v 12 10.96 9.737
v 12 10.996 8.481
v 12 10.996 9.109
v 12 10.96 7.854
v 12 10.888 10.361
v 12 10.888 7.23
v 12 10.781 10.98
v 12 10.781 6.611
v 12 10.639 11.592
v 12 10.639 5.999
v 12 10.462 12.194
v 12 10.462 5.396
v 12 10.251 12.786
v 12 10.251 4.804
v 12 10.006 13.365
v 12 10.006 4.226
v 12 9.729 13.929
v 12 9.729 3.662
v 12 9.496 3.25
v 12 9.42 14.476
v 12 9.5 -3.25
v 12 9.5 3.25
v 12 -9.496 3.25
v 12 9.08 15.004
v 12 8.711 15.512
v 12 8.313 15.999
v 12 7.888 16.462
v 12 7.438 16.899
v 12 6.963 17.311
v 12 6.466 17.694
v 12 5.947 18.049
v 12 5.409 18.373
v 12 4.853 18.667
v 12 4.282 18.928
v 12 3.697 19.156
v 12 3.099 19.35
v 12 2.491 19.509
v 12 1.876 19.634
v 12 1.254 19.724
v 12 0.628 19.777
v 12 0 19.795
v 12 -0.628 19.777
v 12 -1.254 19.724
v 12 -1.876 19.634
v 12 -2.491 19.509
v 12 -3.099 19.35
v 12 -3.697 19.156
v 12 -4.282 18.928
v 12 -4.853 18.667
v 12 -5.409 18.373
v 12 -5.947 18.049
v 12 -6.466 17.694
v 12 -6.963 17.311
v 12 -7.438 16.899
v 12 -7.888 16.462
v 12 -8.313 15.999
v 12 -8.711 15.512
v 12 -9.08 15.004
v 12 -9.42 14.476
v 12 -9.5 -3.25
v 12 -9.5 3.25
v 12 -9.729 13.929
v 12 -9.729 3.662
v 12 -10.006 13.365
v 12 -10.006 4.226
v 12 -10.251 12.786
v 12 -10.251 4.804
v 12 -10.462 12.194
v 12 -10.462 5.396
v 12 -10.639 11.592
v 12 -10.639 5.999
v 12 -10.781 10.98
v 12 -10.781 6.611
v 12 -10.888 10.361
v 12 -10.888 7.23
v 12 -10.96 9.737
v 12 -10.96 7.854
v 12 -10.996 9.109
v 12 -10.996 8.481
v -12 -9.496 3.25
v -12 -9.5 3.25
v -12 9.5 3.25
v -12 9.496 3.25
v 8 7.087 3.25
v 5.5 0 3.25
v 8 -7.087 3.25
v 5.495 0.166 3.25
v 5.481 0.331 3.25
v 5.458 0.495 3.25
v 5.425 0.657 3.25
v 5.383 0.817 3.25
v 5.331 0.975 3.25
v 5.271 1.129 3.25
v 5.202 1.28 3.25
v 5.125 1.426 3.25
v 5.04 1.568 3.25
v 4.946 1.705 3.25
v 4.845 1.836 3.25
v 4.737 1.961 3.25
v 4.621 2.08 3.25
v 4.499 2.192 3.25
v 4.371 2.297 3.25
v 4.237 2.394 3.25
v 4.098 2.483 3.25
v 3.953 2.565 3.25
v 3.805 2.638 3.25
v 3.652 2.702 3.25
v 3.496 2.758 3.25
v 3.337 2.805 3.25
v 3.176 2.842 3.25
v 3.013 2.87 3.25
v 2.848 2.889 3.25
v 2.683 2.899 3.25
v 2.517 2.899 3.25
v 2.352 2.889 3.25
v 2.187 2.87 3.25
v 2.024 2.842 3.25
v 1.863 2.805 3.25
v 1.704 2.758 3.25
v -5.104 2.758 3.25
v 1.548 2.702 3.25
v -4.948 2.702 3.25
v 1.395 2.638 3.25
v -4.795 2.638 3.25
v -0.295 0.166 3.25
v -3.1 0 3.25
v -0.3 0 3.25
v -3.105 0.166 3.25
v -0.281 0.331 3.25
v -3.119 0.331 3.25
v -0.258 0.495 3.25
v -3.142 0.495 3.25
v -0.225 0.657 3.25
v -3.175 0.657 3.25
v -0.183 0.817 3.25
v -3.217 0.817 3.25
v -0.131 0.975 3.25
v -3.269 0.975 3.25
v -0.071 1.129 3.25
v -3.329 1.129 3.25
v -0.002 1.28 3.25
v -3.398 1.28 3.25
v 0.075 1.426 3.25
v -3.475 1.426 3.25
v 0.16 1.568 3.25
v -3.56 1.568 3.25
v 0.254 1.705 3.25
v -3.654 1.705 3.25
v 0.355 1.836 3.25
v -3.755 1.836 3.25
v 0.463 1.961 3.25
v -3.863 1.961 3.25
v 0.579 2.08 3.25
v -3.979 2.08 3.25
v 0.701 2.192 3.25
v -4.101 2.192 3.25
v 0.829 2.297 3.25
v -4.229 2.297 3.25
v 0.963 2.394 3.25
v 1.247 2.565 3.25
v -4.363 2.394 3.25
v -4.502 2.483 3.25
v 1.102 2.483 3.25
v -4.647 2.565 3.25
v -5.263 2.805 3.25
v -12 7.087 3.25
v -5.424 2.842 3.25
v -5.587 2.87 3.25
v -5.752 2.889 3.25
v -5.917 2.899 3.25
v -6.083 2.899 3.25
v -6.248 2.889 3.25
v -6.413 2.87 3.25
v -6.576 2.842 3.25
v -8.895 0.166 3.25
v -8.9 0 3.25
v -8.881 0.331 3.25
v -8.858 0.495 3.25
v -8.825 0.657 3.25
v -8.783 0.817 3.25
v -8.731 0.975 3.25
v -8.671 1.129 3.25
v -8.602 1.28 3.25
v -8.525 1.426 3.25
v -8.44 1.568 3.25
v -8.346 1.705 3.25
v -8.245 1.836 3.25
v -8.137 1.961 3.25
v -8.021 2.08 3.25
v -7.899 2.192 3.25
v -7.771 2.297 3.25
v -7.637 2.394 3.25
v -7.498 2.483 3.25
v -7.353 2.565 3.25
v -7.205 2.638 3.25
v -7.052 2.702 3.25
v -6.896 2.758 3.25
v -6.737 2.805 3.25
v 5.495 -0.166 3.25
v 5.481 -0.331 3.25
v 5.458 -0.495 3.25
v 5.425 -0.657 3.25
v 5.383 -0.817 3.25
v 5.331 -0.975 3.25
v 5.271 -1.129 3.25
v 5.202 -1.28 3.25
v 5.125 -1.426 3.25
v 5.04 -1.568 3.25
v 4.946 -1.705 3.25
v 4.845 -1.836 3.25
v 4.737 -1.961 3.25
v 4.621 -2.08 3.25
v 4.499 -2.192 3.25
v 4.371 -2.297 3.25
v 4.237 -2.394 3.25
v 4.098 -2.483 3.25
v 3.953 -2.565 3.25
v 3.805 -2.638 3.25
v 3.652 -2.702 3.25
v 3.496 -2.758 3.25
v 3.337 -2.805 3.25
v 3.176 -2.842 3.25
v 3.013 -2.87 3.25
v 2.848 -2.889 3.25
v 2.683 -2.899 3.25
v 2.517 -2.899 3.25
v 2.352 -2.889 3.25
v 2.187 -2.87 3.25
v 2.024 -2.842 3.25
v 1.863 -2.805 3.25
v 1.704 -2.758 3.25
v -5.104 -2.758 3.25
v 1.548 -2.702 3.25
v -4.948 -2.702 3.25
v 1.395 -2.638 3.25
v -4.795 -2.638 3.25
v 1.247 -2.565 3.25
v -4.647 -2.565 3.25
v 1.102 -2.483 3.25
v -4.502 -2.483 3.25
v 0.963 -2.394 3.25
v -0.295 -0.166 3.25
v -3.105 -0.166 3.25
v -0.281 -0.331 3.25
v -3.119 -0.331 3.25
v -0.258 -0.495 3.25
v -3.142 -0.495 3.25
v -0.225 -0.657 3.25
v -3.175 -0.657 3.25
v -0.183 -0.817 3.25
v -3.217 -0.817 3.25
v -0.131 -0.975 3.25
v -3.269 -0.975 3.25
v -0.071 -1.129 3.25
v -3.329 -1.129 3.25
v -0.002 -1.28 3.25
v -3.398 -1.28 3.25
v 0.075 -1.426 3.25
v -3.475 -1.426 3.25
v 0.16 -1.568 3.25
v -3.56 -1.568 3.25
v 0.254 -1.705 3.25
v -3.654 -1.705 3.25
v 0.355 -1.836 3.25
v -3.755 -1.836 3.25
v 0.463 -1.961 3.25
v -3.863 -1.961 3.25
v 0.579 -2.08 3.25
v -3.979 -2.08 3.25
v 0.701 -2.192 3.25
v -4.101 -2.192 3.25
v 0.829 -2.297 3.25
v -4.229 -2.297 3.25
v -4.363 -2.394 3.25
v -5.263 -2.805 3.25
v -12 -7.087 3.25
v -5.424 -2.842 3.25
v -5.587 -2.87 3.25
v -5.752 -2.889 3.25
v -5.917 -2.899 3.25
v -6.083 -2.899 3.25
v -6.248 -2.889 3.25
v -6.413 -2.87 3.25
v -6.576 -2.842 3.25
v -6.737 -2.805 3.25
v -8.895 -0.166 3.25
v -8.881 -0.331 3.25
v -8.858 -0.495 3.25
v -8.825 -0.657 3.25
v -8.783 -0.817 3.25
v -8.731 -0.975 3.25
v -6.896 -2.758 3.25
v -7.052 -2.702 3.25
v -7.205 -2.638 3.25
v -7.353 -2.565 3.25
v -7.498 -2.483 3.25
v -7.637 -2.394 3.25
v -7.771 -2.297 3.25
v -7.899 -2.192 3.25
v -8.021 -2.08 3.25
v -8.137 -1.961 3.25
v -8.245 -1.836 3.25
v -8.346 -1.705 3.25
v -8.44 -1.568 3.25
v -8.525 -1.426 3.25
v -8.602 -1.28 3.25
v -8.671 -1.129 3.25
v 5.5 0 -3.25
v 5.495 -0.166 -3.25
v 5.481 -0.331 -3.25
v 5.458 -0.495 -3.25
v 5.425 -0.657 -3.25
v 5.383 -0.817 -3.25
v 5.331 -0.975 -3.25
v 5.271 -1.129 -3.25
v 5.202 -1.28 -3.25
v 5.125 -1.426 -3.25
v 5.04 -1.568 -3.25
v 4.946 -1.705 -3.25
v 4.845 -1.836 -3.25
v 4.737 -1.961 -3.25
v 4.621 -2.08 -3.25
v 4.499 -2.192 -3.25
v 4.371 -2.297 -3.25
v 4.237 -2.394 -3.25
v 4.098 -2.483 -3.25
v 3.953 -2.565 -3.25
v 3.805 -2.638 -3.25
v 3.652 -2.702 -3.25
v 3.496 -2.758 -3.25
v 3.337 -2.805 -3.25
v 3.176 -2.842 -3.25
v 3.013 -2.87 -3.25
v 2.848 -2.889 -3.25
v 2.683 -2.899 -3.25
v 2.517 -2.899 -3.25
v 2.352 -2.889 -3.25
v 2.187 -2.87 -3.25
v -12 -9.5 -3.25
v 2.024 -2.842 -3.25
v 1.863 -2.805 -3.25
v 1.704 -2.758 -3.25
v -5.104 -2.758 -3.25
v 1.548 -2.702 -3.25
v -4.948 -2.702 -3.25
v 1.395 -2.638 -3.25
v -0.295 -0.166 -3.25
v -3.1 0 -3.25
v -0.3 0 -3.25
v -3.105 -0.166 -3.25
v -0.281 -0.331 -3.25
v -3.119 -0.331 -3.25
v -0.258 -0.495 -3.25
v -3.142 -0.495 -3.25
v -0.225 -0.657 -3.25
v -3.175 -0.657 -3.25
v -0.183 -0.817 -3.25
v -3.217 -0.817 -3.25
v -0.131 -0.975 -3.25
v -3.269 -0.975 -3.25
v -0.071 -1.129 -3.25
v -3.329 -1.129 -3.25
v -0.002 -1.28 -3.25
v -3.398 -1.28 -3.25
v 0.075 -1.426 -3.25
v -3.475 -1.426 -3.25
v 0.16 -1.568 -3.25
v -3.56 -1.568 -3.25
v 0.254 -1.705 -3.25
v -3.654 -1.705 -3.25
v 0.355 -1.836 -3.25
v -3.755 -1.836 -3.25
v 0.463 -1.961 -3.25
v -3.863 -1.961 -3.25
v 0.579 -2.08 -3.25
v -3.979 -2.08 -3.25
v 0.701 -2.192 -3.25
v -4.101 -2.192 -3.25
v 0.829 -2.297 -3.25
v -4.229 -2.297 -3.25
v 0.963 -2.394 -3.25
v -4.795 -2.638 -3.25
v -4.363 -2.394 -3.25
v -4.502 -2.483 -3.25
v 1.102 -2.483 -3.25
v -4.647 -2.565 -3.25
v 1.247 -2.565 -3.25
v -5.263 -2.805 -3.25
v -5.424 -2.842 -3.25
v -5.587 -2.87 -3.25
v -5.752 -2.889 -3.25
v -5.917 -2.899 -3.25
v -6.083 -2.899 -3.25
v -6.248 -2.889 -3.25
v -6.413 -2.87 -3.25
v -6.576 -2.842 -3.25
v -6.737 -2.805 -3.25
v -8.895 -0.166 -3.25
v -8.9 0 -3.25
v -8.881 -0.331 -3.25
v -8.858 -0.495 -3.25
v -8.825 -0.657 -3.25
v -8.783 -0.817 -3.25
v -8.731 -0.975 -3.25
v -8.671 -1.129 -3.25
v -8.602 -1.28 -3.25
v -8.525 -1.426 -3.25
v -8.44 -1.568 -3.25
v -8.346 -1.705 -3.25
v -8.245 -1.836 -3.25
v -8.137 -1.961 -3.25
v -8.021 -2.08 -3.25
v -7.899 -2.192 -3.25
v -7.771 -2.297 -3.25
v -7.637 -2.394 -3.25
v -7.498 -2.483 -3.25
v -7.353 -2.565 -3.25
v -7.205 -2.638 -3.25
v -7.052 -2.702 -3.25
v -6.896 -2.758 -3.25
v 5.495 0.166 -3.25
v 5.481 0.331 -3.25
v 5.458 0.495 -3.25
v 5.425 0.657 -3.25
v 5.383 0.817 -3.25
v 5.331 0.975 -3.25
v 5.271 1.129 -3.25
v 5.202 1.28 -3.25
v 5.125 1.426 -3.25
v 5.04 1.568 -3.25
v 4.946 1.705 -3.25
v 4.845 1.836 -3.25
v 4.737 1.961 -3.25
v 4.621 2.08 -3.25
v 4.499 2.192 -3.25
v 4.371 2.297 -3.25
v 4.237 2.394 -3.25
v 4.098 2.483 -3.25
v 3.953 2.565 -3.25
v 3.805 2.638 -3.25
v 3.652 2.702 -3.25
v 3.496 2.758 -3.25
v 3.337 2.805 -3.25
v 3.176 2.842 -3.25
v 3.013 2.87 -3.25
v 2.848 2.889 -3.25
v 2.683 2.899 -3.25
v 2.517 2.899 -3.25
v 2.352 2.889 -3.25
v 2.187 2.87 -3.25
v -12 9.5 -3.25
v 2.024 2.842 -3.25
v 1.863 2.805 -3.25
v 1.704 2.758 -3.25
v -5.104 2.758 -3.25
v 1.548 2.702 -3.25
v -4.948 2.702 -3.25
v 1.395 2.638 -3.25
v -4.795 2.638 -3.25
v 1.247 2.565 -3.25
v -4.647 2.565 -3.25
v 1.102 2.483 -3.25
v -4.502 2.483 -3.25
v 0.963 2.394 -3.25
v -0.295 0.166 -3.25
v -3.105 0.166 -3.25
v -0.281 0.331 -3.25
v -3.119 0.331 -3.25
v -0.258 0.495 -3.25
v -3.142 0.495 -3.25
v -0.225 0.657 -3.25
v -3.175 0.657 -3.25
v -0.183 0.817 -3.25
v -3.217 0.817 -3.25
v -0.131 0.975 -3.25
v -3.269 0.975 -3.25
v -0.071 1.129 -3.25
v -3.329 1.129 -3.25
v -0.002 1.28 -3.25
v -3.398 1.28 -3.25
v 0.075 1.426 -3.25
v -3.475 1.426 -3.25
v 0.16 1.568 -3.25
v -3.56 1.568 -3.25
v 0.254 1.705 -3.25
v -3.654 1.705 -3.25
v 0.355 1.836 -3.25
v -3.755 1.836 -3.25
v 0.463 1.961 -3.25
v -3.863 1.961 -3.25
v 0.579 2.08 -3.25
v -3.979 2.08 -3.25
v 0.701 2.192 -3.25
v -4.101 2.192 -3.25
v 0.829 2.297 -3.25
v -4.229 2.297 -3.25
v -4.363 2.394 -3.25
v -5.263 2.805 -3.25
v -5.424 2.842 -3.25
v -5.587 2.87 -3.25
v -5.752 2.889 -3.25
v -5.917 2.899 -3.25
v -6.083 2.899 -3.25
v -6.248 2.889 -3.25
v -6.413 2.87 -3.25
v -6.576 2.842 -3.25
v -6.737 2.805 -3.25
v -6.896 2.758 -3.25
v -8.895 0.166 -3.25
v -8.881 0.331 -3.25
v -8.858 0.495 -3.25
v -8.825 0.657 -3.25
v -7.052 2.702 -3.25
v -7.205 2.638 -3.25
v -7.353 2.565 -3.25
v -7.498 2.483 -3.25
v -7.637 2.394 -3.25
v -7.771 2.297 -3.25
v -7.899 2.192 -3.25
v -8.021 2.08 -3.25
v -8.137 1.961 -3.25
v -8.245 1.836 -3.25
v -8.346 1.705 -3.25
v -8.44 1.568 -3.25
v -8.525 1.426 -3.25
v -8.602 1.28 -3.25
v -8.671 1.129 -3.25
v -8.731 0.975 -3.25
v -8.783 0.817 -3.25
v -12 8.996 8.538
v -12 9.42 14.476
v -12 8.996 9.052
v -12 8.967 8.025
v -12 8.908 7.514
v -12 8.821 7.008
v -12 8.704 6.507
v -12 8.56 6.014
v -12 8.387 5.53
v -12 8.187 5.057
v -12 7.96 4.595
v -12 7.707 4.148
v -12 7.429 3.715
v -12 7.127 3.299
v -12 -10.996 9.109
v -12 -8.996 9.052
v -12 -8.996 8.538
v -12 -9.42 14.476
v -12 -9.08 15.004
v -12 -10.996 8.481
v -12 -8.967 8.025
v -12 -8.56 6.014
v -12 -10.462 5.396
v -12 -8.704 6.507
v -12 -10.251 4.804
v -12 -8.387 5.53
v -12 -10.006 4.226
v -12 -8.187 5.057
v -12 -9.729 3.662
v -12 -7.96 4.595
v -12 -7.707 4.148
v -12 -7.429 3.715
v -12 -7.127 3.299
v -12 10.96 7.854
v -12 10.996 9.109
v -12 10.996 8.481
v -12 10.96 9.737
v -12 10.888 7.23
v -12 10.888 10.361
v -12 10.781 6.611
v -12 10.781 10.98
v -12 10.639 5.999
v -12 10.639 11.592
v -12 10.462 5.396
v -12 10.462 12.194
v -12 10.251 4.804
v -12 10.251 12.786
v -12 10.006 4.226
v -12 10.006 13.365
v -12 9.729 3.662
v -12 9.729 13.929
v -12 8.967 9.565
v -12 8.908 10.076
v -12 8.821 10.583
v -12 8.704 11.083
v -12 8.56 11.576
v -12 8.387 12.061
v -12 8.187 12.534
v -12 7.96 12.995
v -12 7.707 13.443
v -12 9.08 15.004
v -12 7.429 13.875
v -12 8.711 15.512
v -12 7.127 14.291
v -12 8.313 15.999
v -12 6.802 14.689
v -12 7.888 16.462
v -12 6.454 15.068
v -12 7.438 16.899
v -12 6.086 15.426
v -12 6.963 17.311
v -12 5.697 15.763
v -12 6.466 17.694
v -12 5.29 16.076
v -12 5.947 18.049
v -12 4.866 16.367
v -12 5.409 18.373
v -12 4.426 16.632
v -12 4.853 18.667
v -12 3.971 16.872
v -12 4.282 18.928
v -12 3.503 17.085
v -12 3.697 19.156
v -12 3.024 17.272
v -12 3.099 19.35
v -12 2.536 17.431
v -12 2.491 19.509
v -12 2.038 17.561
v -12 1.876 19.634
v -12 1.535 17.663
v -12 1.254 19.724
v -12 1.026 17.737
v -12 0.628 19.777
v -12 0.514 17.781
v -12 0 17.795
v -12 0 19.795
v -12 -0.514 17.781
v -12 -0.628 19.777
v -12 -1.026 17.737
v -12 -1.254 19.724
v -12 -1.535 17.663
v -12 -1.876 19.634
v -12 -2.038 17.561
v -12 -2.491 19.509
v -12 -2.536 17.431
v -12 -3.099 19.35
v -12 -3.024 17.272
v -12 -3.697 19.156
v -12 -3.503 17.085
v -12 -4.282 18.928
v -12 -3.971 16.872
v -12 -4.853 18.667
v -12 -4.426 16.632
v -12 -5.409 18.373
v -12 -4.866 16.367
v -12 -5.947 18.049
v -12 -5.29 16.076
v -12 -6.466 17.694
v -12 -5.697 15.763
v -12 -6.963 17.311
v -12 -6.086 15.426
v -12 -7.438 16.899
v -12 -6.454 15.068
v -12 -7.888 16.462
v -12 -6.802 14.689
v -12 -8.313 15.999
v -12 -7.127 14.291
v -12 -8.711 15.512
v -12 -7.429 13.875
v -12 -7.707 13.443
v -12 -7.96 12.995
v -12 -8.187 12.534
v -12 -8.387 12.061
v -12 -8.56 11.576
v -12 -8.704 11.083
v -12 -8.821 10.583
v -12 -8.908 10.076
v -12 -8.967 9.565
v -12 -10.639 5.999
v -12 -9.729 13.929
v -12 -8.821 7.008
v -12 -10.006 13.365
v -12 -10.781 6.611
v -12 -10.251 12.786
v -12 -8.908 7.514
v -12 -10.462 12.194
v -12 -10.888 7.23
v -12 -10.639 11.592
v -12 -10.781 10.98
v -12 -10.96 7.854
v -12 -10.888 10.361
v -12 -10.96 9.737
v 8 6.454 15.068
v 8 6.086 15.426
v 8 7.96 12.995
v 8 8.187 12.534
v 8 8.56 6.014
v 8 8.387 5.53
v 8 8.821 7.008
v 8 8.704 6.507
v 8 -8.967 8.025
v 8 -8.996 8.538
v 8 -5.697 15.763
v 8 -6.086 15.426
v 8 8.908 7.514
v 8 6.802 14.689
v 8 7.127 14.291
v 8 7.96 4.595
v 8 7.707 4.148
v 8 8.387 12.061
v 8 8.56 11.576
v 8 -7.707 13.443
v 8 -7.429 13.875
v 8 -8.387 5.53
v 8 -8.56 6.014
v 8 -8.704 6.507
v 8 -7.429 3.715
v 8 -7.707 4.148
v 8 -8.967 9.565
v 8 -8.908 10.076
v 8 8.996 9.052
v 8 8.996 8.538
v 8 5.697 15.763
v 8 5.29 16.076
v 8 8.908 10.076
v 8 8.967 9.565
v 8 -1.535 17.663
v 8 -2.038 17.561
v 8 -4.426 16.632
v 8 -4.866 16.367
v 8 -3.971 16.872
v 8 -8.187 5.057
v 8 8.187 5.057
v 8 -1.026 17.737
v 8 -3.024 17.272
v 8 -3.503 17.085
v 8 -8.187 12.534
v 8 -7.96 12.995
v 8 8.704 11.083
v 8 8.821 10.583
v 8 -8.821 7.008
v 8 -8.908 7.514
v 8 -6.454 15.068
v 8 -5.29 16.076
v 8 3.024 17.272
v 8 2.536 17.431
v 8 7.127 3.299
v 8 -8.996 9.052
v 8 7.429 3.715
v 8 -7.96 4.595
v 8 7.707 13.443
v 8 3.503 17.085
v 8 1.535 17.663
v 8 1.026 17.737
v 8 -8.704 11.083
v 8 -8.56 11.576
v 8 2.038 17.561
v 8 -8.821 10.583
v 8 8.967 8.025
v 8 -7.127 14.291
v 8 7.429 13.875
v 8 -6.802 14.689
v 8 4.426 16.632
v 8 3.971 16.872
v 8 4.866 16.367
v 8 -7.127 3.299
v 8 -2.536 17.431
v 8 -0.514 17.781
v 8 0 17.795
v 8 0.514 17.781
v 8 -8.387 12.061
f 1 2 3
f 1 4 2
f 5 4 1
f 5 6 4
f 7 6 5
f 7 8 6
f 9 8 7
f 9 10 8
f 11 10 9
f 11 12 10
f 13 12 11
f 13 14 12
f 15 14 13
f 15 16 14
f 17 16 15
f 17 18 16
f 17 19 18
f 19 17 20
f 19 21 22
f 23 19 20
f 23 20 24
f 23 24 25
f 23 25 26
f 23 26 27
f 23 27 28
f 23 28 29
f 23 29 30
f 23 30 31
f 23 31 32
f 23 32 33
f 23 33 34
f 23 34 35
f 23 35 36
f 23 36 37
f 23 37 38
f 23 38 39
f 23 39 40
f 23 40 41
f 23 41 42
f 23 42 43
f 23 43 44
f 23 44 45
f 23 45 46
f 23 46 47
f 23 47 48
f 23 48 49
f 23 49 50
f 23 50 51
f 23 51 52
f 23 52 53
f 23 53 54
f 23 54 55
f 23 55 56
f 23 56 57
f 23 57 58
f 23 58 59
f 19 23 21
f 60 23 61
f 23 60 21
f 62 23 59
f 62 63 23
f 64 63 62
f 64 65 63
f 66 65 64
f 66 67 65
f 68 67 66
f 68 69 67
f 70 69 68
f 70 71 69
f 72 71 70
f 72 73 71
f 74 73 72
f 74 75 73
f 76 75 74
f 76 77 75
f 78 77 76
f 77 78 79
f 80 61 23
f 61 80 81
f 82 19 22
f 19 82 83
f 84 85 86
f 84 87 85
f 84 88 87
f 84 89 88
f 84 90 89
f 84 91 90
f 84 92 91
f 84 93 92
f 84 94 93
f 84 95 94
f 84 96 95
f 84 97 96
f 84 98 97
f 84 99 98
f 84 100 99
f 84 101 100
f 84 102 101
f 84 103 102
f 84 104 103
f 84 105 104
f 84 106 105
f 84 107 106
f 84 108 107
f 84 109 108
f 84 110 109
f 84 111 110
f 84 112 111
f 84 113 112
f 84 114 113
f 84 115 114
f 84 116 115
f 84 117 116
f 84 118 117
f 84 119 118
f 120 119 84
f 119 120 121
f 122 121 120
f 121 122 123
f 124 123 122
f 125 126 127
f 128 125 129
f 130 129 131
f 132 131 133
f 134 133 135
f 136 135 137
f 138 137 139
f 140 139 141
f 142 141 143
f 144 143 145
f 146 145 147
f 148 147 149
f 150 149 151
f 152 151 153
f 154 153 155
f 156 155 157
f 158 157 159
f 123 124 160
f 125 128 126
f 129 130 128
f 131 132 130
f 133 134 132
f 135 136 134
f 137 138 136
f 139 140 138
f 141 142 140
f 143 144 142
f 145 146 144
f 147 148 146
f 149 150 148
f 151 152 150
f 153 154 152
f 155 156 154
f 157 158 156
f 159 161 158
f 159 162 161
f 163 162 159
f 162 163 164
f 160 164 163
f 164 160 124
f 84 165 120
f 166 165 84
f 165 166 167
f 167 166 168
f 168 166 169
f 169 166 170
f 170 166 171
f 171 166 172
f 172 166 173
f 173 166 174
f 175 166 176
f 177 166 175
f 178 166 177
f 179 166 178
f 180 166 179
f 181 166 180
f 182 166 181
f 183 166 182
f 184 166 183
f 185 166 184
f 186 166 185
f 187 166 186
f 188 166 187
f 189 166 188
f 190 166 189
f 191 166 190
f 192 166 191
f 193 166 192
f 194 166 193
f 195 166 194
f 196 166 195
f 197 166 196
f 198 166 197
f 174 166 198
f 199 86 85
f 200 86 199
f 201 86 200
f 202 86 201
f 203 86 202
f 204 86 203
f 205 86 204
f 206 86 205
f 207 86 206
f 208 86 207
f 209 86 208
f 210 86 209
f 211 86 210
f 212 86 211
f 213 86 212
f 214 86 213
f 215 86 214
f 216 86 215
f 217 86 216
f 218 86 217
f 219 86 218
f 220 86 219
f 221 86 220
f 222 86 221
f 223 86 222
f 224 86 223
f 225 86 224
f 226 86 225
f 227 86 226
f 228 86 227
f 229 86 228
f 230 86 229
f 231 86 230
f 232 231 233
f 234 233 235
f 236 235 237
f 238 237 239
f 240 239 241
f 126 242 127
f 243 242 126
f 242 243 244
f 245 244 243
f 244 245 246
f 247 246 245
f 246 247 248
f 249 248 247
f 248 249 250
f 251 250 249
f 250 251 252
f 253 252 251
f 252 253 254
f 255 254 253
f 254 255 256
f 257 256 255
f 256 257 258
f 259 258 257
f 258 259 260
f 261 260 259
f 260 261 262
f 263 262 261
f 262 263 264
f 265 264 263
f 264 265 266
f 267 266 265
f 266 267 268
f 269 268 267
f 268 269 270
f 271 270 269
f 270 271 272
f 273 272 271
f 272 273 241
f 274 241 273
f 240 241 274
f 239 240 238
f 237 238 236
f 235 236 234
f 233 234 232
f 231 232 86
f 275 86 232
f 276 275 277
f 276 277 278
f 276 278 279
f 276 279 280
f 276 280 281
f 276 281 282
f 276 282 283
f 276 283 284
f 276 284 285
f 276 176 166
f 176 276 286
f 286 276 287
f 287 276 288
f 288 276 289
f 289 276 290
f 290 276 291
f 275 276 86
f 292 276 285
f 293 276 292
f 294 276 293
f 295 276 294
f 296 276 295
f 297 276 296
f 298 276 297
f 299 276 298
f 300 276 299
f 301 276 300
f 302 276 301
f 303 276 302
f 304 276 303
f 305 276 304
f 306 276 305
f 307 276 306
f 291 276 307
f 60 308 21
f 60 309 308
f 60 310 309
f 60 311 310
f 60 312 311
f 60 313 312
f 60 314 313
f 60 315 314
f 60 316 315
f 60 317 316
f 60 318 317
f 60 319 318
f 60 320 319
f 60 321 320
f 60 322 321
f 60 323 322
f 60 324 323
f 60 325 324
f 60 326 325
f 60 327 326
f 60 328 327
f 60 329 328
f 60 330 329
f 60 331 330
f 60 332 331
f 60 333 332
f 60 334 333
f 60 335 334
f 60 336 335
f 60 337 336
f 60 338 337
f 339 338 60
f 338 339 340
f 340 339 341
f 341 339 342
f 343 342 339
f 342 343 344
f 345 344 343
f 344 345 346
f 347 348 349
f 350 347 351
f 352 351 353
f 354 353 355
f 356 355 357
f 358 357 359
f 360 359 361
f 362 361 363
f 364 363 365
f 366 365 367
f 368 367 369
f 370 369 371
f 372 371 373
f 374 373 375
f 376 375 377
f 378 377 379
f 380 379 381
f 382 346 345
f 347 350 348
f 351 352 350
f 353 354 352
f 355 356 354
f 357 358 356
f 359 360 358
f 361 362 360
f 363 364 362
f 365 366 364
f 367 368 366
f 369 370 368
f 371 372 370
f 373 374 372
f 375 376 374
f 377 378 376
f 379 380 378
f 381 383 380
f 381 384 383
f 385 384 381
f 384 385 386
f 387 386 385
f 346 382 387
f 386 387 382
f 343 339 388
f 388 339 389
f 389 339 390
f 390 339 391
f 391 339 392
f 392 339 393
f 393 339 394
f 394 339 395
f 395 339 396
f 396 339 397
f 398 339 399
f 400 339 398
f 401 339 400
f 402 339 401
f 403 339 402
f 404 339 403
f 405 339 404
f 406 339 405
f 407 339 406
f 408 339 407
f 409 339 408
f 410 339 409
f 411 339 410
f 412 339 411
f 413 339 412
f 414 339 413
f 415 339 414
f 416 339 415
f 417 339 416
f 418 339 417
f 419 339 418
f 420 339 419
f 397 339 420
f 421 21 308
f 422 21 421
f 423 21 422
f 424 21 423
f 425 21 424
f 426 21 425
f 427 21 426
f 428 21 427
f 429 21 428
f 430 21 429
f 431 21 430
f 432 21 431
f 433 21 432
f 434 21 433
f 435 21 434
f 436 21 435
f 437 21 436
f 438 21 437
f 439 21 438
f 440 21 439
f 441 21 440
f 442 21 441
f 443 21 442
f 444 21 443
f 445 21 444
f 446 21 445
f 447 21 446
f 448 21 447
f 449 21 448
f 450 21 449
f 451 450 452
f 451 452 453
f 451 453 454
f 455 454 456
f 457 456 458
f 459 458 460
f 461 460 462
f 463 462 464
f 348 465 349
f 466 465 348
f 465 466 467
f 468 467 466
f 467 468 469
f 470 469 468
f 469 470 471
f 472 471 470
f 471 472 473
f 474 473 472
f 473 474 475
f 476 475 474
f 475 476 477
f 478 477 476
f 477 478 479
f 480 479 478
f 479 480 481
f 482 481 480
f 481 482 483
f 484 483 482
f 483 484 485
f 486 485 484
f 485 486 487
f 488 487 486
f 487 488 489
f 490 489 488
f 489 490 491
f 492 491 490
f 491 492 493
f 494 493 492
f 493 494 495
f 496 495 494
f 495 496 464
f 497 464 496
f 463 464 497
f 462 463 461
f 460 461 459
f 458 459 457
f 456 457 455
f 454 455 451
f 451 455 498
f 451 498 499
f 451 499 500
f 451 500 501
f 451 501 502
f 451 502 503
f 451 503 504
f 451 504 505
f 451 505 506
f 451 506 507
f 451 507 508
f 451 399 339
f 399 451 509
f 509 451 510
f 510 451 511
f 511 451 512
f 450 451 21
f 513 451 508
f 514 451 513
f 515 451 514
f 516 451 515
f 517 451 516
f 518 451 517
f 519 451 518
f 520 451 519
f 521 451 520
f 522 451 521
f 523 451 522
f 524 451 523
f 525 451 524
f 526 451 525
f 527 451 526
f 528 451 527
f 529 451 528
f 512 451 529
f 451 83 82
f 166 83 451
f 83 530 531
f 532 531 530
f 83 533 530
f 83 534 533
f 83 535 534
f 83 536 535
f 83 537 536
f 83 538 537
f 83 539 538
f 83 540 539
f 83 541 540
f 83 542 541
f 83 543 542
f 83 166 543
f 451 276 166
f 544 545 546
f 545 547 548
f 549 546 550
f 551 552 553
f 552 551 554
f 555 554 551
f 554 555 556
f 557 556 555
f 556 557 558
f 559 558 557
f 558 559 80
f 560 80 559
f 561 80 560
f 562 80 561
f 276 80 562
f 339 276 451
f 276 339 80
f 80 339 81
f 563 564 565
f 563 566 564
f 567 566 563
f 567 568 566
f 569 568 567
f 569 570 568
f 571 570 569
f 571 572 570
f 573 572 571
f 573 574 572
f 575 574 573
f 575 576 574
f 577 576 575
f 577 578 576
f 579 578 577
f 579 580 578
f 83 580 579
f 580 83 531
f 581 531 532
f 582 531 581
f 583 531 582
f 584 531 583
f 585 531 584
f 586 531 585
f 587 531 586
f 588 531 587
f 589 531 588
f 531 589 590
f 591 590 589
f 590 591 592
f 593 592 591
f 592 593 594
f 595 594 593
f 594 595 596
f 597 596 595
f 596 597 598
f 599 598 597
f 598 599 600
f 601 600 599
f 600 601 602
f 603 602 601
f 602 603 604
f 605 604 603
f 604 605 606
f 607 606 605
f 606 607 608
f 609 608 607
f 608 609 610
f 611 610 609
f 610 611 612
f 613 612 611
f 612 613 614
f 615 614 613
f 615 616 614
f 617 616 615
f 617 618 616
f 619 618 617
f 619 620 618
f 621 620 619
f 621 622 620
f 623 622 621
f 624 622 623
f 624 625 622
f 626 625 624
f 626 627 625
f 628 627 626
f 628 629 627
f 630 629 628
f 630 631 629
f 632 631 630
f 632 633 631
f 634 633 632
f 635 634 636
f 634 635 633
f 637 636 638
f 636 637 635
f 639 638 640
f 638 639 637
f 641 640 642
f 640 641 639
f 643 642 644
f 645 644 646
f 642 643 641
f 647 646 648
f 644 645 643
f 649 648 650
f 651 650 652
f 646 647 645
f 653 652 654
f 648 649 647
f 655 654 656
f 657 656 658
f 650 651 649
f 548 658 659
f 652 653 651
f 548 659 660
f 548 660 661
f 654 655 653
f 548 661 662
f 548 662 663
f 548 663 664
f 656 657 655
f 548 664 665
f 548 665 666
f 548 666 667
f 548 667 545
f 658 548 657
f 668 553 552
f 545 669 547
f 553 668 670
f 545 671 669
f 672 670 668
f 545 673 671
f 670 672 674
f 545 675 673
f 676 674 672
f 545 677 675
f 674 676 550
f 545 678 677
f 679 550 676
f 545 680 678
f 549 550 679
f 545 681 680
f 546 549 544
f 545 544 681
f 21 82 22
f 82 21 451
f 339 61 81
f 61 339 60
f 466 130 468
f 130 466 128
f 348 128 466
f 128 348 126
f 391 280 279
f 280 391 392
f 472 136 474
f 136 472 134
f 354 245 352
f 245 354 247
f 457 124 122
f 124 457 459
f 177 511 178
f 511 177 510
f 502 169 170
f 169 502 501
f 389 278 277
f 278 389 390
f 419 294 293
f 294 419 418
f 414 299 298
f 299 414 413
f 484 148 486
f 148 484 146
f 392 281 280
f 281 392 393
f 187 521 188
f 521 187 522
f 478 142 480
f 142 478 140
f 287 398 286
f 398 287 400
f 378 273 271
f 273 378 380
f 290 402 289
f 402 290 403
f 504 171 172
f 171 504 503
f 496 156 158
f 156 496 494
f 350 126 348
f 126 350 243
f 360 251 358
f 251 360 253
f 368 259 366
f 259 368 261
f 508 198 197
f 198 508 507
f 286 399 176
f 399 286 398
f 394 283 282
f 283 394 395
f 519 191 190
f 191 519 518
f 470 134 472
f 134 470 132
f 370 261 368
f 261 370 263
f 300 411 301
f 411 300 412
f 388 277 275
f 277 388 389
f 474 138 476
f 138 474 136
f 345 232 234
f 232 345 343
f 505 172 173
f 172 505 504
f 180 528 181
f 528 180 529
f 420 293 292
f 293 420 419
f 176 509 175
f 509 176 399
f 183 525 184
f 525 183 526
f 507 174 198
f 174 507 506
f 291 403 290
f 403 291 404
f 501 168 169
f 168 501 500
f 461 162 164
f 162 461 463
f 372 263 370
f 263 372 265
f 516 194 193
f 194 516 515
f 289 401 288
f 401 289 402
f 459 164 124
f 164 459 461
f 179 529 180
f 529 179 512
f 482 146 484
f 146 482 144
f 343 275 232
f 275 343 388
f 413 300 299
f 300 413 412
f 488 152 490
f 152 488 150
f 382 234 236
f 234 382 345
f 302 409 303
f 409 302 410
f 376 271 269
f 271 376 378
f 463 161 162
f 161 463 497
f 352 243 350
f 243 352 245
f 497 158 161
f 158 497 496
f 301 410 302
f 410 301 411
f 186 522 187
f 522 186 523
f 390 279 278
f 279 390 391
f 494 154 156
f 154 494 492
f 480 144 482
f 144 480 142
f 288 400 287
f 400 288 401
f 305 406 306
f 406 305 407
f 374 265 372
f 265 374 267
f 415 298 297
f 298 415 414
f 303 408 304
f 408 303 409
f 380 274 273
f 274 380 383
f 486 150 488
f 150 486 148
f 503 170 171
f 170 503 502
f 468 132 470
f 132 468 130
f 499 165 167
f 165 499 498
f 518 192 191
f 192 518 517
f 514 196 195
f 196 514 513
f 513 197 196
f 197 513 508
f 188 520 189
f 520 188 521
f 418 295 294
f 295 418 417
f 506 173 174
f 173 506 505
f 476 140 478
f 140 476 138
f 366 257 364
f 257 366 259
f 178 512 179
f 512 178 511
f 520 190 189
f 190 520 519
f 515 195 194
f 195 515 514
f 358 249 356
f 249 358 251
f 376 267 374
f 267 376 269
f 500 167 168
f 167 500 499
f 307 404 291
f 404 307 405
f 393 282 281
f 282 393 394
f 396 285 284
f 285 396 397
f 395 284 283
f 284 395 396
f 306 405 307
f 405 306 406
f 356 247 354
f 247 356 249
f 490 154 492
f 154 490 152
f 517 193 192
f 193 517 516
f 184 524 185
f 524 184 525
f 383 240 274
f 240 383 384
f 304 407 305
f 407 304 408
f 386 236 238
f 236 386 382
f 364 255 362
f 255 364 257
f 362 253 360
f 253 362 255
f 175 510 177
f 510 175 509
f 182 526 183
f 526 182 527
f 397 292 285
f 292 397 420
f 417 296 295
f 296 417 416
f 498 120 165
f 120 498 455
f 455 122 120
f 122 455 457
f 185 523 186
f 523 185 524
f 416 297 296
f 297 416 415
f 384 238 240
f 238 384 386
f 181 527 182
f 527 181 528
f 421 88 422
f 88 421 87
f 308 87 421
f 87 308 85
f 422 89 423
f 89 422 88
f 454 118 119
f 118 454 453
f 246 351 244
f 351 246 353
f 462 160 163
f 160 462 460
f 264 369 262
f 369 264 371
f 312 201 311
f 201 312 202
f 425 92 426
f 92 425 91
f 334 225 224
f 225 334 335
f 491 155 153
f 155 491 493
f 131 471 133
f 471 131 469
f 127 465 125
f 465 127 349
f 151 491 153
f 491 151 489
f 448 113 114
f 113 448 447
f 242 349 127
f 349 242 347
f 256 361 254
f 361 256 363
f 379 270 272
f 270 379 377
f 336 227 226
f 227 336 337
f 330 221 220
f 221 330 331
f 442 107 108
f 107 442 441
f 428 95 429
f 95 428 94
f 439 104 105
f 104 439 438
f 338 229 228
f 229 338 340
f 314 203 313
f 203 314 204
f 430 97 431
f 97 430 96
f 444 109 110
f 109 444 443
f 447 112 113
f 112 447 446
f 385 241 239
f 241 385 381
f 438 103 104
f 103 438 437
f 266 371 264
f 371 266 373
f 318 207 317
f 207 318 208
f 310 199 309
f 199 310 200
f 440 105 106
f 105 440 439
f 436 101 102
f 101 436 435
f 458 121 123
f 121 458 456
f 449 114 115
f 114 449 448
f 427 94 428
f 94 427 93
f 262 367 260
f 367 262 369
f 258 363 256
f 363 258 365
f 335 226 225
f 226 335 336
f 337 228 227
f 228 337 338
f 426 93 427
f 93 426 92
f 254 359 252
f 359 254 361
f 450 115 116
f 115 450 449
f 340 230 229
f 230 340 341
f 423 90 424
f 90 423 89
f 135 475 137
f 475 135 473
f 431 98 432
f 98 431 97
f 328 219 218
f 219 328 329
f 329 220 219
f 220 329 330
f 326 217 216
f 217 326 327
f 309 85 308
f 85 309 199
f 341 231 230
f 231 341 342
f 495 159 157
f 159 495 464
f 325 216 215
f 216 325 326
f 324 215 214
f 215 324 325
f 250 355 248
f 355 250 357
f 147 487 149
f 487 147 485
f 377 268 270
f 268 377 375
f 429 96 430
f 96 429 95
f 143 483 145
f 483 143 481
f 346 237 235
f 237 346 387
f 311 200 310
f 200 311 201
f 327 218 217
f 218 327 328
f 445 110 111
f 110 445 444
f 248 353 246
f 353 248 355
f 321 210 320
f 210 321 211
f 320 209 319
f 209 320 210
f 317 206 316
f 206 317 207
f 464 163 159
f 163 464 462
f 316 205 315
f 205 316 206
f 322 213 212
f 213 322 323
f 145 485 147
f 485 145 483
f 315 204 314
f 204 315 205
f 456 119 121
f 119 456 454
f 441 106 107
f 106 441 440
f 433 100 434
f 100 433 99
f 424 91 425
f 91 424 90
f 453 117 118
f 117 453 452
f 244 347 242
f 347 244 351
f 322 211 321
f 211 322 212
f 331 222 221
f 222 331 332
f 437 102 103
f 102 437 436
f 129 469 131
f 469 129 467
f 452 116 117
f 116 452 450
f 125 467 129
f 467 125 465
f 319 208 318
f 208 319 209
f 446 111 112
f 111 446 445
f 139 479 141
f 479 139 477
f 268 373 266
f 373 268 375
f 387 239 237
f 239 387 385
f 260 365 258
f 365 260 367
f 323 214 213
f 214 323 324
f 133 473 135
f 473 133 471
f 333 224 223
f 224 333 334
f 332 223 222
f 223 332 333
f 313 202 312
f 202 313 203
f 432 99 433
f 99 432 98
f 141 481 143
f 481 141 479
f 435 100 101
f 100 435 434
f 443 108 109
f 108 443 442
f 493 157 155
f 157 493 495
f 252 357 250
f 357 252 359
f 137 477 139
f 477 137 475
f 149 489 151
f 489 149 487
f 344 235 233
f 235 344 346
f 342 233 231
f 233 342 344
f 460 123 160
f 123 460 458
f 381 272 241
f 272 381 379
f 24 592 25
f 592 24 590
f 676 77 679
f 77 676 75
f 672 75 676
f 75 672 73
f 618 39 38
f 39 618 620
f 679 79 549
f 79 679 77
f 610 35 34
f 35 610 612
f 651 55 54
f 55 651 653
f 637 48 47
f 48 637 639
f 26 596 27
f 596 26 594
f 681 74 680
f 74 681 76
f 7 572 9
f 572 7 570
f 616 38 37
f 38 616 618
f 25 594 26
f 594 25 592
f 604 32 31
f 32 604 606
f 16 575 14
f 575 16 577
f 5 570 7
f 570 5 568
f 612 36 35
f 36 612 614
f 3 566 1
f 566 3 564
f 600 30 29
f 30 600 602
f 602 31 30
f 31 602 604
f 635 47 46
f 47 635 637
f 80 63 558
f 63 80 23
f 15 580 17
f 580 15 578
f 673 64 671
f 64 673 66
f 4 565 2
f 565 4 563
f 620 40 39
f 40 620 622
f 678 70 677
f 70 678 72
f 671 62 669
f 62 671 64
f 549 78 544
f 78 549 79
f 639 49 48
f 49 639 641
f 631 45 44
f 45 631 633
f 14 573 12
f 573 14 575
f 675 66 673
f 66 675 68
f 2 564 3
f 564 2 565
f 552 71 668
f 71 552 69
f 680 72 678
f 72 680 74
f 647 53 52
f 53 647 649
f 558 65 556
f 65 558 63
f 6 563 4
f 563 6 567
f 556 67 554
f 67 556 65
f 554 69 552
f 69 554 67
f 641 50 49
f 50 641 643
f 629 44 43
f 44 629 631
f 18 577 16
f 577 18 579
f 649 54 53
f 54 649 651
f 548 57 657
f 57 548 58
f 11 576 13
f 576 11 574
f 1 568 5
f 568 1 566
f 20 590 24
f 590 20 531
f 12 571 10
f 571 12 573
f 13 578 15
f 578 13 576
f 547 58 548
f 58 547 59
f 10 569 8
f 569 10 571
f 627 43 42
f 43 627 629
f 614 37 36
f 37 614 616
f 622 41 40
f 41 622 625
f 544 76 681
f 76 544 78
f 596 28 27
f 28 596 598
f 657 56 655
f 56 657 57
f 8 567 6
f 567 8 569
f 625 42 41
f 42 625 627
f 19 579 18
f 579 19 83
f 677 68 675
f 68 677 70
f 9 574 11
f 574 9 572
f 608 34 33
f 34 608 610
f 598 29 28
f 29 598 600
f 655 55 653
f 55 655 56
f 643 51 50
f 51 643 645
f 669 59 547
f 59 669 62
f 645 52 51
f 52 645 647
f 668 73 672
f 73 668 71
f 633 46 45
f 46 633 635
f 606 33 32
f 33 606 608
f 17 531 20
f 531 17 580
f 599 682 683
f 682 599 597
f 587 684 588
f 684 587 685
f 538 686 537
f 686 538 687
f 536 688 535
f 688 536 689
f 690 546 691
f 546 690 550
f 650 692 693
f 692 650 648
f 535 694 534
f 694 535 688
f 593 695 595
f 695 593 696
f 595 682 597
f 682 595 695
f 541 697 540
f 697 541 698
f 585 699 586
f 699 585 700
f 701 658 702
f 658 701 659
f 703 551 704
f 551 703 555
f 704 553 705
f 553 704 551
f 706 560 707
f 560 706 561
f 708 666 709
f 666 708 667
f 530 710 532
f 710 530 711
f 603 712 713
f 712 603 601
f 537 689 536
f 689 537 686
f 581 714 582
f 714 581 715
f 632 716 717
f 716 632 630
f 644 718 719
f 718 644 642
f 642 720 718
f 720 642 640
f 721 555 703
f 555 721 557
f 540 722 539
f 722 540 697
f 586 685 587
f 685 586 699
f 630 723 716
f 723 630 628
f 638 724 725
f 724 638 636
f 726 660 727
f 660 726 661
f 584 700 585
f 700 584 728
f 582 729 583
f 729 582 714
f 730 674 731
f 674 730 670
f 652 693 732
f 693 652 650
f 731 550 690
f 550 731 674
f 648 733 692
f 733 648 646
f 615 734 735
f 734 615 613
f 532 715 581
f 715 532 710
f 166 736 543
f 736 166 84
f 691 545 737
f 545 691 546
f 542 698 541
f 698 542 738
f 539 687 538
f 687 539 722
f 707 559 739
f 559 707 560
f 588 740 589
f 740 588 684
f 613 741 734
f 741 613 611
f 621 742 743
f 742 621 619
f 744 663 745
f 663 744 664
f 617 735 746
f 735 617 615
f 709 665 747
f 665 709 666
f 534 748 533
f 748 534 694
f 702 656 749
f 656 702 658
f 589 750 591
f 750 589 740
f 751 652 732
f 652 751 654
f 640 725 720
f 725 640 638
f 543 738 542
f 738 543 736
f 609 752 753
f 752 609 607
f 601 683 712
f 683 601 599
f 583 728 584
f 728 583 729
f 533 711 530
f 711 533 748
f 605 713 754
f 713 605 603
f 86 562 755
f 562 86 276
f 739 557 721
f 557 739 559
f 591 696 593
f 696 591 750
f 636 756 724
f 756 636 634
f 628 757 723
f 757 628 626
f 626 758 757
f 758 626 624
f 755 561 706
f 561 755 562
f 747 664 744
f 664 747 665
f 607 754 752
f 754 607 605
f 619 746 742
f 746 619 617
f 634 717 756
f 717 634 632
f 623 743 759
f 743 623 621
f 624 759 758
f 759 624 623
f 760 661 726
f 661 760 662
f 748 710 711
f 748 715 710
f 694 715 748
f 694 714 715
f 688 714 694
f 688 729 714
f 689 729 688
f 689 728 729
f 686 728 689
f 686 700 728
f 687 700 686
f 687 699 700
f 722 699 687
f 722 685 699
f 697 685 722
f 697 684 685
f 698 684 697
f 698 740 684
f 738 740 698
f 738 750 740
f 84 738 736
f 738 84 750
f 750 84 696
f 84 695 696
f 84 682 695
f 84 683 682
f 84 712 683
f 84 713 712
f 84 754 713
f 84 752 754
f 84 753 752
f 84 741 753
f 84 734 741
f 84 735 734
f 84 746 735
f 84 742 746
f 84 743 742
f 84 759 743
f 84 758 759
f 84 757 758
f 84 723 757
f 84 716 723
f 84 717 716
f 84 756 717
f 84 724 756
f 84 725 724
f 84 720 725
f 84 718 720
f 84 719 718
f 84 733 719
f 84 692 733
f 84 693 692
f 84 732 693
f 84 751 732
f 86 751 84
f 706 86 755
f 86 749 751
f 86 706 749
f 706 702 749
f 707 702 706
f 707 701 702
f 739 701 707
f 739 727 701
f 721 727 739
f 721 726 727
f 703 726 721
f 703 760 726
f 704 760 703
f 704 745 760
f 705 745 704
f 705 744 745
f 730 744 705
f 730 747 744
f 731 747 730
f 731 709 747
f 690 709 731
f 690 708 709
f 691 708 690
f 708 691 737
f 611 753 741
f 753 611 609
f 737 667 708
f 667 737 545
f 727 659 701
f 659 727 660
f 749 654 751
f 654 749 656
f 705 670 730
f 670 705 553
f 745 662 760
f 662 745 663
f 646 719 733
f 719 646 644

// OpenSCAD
/*
* FingerCover
* "Parametric" model of a finger sheild. 
* Sheilds the sensory circuitry (IR LED and photodiode) from some 
* ambient light fluctuation/noise. 
*
* @author: Suyash Kumar
*/
$fn=110; // Explicitly sets resolution of arcs
// Parameters: 
led_dia=5.8; // Diameter of the led/photodiode slot
led_rad=led_dia/2; // led/photodiode slot
finger_radius=11; // Outer radius of finger cap cylinder
base_length=24; // Length of the rectangular base
base_width=19; 
base_height=6.5;
wall_thickness=2; // Wall thickness of circular canopy
rear_wall_thickness=4; // Thickness of the rear wall

function determineOffset(r,w)=sqrt((r*r)-(w/2)*(w/2)); // Determines finger cap cylinder offset to align with base

module make_bottom(){
	difference(){
		cube([base_length,base_width,base_height],center=true);
		translate([-base_length/4,0,0]) cylinder(h=base_height, r=led_rad,center=true); // First hole 
		translate([(-base_length/4)+led_dia+2.8,0,0]) cylinder(h=base_height, r=led_dia/2,center=true);	// Second hole
	}
}
module cap_cyl(){
	rotate([0,90,0]) translate([-determineOffset(finger_radius,base_width)-0.5*base_height,0,0]) cylinder(r=finger_radius,h=base_length,center=true); // Makes main finger sheild cylinder
}
module make_canopy(){
	difference(){
		cap_cyl();//Main cylinder
		translate([0,0,0]) cube([base_length*1.5,base_width,base_height], center=true); // base cutoff
		rotate([0,90,0]) translate([-determineOffset(finger_radius,base_width)-0.5*base_height,0,-rear_wall_thickness]) cylinder(r=finger_radius-wall_thickness,h=base_length,center=true); //inner cyl cut out		
	}
}
module make_cover(){
	make_bottom();
	make_canopy();
}
make_cover();
